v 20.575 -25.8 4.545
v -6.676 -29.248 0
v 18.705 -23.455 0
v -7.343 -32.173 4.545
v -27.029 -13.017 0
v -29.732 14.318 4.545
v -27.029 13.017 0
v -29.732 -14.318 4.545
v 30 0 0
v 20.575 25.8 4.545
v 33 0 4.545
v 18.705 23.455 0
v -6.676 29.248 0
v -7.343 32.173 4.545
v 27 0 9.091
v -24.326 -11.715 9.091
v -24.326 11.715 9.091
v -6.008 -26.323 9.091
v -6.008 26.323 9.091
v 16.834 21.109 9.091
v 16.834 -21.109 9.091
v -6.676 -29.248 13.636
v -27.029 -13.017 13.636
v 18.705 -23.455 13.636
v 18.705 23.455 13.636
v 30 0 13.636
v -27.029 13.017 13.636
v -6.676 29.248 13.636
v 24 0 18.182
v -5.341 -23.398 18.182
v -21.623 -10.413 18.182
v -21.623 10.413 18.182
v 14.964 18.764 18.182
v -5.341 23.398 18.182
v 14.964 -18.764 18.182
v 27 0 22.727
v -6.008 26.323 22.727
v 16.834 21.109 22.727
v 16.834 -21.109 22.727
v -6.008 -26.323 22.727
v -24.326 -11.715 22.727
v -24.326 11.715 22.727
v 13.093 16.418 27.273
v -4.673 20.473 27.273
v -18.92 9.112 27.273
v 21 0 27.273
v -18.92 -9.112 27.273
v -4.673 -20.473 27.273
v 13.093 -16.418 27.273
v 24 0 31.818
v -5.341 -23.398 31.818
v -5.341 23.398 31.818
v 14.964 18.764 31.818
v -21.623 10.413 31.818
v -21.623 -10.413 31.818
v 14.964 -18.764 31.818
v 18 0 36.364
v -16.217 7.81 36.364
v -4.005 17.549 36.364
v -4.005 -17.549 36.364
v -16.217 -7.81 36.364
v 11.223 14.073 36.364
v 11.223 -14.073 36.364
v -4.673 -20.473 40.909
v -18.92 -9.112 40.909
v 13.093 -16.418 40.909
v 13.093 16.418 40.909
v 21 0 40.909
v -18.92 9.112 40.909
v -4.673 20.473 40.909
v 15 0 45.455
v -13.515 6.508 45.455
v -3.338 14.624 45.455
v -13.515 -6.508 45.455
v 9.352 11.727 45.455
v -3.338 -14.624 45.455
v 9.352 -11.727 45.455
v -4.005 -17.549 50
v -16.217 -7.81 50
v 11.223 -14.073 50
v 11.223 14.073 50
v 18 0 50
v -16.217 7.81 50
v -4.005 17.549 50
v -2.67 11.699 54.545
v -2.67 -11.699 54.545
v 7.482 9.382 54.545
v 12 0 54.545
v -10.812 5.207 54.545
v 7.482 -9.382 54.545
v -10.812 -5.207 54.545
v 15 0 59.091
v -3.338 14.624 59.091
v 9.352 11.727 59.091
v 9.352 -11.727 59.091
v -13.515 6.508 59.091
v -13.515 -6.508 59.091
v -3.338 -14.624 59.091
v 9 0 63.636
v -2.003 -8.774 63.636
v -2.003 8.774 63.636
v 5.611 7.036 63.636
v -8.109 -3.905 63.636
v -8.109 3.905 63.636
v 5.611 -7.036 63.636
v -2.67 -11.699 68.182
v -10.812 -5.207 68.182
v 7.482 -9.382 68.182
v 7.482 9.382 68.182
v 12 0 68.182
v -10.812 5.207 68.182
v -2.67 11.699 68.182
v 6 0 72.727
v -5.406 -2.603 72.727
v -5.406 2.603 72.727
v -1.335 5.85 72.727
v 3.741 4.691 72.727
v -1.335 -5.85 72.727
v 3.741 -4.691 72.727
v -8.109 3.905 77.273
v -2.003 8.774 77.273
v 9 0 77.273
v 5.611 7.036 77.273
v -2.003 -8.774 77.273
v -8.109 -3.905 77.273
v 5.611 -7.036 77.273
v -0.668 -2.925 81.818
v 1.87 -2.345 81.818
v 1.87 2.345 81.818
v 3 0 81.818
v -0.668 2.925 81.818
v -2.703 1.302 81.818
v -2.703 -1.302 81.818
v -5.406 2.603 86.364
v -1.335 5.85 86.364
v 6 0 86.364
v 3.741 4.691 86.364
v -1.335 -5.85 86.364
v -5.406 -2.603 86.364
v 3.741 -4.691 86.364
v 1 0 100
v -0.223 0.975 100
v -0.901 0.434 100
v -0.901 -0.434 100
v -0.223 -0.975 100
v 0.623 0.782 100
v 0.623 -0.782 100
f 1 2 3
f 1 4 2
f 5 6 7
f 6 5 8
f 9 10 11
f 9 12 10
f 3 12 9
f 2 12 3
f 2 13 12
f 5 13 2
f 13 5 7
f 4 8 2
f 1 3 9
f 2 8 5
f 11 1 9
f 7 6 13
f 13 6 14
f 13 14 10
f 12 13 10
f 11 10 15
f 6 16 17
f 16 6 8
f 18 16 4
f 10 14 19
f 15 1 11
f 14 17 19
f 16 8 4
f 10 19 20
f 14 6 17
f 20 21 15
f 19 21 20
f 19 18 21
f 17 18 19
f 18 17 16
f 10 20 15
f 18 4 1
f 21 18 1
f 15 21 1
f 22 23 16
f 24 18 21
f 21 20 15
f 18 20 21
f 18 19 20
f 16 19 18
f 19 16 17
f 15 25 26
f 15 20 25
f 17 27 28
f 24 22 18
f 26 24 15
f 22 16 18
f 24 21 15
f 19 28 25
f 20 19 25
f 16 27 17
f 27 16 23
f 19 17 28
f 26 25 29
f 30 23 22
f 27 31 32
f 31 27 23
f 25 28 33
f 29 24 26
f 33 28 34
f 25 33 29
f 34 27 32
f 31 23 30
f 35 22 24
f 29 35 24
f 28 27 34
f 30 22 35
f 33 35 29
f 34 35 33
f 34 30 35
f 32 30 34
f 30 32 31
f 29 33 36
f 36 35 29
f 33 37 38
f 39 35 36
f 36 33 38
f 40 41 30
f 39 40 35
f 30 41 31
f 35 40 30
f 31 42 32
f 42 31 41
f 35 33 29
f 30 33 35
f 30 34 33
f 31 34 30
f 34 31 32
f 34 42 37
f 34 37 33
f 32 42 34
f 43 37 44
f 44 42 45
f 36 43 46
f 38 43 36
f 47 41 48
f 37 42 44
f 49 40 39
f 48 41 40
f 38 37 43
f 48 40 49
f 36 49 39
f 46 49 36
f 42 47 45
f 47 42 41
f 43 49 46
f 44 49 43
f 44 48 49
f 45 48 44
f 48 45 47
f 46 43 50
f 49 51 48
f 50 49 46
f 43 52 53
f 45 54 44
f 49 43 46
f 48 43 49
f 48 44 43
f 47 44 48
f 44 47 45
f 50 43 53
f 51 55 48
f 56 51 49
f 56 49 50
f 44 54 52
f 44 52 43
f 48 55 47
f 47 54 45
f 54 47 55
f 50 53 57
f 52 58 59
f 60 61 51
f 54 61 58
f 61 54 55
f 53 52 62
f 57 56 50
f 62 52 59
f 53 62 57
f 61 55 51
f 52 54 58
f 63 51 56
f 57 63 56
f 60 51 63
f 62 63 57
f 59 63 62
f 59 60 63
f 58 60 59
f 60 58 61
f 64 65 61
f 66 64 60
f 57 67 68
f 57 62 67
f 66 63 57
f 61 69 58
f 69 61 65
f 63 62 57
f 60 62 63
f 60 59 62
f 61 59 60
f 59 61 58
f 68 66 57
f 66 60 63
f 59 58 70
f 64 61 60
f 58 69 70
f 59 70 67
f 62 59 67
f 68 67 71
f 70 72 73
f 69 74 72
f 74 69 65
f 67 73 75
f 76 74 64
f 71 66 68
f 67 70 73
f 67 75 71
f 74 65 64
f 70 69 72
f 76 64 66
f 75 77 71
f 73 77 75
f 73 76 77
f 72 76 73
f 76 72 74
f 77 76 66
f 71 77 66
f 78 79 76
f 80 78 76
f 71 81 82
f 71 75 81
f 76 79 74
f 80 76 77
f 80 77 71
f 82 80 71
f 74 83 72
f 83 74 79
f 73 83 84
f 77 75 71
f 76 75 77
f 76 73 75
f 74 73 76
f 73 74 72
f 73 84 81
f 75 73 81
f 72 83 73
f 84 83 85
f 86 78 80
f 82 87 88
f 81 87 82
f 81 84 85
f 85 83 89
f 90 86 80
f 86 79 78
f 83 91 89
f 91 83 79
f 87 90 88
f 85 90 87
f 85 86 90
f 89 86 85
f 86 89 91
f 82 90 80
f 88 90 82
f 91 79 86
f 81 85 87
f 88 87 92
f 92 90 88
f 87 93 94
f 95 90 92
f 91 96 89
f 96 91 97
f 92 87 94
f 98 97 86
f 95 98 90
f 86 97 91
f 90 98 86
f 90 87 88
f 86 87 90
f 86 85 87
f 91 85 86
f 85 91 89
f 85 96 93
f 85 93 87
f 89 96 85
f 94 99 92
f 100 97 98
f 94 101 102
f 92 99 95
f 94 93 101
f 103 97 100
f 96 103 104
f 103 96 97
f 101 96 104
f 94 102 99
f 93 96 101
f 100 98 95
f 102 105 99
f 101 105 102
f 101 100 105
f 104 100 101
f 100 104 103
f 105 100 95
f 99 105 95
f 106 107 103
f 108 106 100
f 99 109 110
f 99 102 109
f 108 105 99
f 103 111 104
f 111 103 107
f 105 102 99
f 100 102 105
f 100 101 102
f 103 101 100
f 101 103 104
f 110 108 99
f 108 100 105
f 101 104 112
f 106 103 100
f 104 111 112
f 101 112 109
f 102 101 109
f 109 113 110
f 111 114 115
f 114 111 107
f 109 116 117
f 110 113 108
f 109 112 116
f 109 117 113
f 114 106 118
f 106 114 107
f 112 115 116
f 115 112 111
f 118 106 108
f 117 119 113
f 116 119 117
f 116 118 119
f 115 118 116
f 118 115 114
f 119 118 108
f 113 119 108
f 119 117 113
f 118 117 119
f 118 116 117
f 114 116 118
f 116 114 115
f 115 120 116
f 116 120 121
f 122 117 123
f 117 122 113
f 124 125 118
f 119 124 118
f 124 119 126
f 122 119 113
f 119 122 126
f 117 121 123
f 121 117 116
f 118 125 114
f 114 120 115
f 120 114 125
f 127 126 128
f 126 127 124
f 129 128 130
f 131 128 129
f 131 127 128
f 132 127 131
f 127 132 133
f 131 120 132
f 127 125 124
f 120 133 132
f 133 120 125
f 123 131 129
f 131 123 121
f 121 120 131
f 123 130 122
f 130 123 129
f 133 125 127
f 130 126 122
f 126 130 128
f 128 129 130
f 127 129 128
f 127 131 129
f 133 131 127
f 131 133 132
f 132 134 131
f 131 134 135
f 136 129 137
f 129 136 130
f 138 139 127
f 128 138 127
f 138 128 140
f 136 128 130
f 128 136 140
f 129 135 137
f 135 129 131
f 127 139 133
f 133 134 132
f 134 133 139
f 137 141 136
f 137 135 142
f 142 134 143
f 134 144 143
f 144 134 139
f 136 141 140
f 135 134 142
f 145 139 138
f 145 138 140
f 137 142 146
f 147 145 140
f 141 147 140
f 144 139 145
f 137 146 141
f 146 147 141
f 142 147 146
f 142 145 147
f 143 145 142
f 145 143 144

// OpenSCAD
/*
 * Customizable Christmas Tree - https://www.thingiverse.com/thing:2694509
 * by Dennis Hofmann - https://www.thingiverse.com/mightynozzle/about
 * created 2017-12-06
 * version v1.0
 *
 * Changelog
 * --------------
 * v1.0:
 *      - final design
 * --------------
 * 
 * This work is licensed under the Creative Commons - Attribution - NonCommercial - ShareAlike license.
 * https://creativecommons.org/licenses/by-nc-sa/3.0/
 */


 // Parameter Section //
//-------------------//

// The height of the Tree.
tree_height_in_millimeter = 100; //[10:400]

// The bottom diameter of the Tree. Please ensure in the preview, that the angle of the segments are not too flat. You can correct it by decreasing the diameter and/or increasing the height Otherwise it will cause print fails if you are using vase mode or zero infill!
tree_bottom_diameter_in_millimeter = 66; //[10:300]

// Number of segments.
tree_segments = 10; //[3:100]

// Set the number of sides. A value between 3 and 10 looks like a low poly Tree. Greater than 24 looks like a round tree.
number_of_sides = 7;  //[3:100]

/* [Hidden] */
segment_h = tree_height_in_millimeter / (tree_segments + 1);
half_segment_h = segment_h / 2;
segment_w = tree_bottom_diameter_in_millimeter / (tree_segments + 1);
tree_d = tree_bottom_diameter_in_millimeter;


 // Program Section //
//-----------------//

color("green")
for(segment = [0:1:tree_segments - 1]) {
    bottom_d = tree_d - segment_w * (segment + 1) > 0 ? tree_d - segment_w * (segment + 1) : 2;
    middle_d = tree_d - segment_w * segment > 0 ? tree_d - segment_w * segment : 2;
    top_d = tree_d - segment_w * (segment + 2) > 0 ? tree_d - segment_w * (segment + 2) : 2;
    dynamic_half_segment_h = segment == tree_segments - 1 ? half_segment_h * 3 : half_segment_h;
    translate([0, 0, segment_h * segment]) {        
        cylinder(d1 = bottom_d, d2 = middle_d, h = half_segment_h, $fn = number_of_sides);
        translate([0, 0, half_segment_h]) {
            cylinder(d1 = middle_d, d2 = top_d, h = dynamic_half_segment_h, $fn = number_of_sides);
        }
    }
}
